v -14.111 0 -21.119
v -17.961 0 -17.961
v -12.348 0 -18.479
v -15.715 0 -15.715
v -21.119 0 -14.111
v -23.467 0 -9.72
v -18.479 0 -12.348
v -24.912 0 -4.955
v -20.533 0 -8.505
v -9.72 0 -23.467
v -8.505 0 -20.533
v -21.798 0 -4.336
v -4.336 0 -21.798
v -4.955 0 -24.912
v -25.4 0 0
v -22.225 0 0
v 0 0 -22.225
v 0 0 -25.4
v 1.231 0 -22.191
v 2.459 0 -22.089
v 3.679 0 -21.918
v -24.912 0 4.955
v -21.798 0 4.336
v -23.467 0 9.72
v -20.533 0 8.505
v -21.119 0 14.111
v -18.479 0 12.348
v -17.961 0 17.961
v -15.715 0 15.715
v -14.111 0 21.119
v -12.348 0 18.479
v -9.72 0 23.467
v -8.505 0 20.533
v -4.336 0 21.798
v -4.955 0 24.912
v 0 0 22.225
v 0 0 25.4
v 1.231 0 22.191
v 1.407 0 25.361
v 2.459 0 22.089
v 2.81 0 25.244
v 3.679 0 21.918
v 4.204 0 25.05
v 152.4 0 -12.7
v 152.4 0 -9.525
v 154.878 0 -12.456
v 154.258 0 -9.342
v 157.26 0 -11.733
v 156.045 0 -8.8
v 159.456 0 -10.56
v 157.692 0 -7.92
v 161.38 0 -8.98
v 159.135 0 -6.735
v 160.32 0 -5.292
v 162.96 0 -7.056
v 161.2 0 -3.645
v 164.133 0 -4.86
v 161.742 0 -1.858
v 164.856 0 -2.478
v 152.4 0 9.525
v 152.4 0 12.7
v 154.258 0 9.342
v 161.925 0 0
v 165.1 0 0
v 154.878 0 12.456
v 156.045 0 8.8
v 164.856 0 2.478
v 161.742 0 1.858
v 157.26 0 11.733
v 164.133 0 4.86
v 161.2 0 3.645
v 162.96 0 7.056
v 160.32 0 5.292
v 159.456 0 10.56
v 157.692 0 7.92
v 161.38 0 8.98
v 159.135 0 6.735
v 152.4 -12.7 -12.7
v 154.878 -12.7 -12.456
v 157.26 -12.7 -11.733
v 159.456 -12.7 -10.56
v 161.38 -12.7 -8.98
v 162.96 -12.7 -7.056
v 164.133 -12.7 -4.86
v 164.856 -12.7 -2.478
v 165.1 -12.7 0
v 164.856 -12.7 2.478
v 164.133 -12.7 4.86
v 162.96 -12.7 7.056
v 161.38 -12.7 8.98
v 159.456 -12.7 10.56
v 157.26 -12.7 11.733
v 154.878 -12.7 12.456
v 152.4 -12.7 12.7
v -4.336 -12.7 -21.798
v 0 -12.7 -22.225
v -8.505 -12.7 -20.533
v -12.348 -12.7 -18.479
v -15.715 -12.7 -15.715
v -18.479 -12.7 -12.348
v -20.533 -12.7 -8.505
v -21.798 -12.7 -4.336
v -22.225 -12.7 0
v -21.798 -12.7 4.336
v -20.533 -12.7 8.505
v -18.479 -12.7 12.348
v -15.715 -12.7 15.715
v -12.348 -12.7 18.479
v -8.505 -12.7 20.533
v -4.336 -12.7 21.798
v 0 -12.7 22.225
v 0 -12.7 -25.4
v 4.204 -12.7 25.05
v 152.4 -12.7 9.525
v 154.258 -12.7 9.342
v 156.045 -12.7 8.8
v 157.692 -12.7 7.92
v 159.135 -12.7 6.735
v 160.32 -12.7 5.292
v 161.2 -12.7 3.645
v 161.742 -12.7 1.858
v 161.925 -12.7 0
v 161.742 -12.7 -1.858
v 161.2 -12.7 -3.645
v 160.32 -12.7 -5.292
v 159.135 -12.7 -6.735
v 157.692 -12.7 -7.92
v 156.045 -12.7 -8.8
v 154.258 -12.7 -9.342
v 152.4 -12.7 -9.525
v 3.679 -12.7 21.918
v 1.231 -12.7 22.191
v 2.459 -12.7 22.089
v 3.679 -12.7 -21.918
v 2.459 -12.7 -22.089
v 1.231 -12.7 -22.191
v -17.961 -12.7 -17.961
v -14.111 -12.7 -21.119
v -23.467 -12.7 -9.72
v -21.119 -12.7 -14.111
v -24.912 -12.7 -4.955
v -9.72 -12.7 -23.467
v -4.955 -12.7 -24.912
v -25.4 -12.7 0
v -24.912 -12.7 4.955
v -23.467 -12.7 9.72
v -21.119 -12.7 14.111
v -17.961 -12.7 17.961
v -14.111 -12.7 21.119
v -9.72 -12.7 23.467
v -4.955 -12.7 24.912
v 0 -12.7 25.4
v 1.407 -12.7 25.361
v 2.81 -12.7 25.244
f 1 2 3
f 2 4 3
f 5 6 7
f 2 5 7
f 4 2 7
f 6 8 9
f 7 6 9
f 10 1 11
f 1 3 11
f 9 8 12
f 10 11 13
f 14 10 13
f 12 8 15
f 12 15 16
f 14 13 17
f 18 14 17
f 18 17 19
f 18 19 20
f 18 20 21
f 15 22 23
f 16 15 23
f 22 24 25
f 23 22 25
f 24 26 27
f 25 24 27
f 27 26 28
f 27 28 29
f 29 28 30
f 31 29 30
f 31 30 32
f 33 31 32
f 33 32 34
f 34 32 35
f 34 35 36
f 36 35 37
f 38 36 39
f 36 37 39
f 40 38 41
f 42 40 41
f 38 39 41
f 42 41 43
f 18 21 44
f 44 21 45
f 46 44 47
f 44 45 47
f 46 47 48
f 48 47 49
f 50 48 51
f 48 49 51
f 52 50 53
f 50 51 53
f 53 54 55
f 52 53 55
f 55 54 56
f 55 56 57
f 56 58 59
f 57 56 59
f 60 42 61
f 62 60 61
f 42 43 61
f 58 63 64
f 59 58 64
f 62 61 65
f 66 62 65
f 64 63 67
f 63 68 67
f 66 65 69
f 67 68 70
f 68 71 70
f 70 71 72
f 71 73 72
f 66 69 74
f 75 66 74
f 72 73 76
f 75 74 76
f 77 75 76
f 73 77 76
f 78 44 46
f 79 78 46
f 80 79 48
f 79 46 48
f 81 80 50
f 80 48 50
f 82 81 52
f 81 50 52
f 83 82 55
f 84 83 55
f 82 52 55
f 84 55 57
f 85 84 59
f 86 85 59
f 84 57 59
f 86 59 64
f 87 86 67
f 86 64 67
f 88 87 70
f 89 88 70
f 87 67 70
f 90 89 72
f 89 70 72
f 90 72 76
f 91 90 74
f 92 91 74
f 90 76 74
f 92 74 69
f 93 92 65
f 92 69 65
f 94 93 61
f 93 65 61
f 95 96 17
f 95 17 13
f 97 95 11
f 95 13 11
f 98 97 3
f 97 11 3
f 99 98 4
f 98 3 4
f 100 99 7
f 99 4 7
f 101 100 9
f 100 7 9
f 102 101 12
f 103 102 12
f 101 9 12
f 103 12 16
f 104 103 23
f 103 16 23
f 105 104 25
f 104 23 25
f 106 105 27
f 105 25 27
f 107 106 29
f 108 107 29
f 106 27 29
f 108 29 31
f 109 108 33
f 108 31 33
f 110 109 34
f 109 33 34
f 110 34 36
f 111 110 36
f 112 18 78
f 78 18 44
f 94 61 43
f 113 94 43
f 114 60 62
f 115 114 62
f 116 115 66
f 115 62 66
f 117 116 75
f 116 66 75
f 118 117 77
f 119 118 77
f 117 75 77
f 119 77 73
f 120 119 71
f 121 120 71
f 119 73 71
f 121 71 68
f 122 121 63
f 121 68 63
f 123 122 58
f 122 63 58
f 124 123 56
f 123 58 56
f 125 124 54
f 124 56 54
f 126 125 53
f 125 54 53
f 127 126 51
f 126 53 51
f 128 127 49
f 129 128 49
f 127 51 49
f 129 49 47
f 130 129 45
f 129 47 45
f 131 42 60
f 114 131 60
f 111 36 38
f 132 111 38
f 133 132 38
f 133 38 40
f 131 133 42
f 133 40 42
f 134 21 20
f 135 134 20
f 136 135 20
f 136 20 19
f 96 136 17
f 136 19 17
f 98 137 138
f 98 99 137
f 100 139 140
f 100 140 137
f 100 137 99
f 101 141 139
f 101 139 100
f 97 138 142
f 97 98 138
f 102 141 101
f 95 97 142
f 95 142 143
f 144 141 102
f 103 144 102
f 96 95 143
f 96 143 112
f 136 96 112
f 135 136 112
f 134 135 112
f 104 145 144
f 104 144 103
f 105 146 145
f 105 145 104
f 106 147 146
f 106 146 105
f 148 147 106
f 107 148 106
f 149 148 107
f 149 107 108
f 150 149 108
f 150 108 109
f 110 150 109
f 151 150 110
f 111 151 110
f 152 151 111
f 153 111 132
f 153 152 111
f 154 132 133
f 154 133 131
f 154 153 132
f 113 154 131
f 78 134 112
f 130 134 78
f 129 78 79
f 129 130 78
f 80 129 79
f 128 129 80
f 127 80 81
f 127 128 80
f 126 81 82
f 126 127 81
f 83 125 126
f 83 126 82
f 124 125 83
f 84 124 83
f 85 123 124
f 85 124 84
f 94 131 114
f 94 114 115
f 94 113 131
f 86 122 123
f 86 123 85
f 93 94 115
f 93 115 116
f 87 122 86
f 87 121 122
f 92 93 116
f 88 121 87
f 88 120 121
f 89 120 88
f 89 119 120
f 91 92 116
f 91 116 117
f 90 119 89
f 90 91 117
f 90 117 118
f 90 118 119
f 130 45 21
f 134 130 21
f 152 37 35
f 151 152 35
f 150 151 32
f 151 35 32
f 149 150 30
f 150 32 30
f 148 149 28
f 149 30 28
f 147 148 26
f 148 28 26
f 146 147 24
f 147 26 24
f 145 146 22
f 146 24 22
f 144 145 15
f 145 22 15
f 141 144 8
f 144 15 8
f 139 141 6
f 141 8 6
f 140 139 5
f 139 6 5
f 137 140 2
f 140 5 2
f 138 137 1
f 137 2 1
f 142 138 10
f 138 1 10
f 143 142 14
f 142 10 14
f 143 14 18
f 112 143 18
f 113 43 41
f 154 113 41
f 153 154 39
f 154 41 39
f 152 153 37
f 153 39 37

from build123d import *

# Parameters (mm, degrees)
F1_DEPTH = 12.7


with BuildPart() as f1:
    # F0 (on Front) → F1 (new body)
    with BuildSketch(Plane.XZ):
        with BuildLine():
            Line((0, 25.4), (4.204138, 25.049655))
            ThreePointArc((4.204138, 25.049655), (2.109355, 25.312262), (0, 25.4))
        make_face()
        with BuildLine():
            Line((152.4, 12.7), (4.204138, 25.049655))
            Line((4.204138, 25.049655), (0, 25.4))
            ThreePointArc((0, 25.4), (-25.4, 0), (0, -25.4))
            Line((0, -25.4), (152.4, -12.7))
            ThreePointArc((152.4, -12.7), (165.1, 0), (152.4, 12.7))
        make_face()
        with BuildLine():
            ThreePointArc((0, 22.225), (1.845686, 22.148229), (3.678621, 21.918448))
            Line((3.678621, 21.918448), (152.4, 9.525))
            ThreePointArc((152.4, 9.525), (161.925, 0), (152.4, -9.525))
            Line((152.4, -9.525), (3.678621, -21.918448))
            ThreePointArc((3.678621, -21.918448), (1.845686, -22.148229), (0, -22.225))
            ThreePointArc((0, -22.225), (-22.225, 0), (0, 22.225))
        make_face(mode=Mode.SUBTRACT)
    extrude(amount=F1_DEPTH)


solid = f1.part
